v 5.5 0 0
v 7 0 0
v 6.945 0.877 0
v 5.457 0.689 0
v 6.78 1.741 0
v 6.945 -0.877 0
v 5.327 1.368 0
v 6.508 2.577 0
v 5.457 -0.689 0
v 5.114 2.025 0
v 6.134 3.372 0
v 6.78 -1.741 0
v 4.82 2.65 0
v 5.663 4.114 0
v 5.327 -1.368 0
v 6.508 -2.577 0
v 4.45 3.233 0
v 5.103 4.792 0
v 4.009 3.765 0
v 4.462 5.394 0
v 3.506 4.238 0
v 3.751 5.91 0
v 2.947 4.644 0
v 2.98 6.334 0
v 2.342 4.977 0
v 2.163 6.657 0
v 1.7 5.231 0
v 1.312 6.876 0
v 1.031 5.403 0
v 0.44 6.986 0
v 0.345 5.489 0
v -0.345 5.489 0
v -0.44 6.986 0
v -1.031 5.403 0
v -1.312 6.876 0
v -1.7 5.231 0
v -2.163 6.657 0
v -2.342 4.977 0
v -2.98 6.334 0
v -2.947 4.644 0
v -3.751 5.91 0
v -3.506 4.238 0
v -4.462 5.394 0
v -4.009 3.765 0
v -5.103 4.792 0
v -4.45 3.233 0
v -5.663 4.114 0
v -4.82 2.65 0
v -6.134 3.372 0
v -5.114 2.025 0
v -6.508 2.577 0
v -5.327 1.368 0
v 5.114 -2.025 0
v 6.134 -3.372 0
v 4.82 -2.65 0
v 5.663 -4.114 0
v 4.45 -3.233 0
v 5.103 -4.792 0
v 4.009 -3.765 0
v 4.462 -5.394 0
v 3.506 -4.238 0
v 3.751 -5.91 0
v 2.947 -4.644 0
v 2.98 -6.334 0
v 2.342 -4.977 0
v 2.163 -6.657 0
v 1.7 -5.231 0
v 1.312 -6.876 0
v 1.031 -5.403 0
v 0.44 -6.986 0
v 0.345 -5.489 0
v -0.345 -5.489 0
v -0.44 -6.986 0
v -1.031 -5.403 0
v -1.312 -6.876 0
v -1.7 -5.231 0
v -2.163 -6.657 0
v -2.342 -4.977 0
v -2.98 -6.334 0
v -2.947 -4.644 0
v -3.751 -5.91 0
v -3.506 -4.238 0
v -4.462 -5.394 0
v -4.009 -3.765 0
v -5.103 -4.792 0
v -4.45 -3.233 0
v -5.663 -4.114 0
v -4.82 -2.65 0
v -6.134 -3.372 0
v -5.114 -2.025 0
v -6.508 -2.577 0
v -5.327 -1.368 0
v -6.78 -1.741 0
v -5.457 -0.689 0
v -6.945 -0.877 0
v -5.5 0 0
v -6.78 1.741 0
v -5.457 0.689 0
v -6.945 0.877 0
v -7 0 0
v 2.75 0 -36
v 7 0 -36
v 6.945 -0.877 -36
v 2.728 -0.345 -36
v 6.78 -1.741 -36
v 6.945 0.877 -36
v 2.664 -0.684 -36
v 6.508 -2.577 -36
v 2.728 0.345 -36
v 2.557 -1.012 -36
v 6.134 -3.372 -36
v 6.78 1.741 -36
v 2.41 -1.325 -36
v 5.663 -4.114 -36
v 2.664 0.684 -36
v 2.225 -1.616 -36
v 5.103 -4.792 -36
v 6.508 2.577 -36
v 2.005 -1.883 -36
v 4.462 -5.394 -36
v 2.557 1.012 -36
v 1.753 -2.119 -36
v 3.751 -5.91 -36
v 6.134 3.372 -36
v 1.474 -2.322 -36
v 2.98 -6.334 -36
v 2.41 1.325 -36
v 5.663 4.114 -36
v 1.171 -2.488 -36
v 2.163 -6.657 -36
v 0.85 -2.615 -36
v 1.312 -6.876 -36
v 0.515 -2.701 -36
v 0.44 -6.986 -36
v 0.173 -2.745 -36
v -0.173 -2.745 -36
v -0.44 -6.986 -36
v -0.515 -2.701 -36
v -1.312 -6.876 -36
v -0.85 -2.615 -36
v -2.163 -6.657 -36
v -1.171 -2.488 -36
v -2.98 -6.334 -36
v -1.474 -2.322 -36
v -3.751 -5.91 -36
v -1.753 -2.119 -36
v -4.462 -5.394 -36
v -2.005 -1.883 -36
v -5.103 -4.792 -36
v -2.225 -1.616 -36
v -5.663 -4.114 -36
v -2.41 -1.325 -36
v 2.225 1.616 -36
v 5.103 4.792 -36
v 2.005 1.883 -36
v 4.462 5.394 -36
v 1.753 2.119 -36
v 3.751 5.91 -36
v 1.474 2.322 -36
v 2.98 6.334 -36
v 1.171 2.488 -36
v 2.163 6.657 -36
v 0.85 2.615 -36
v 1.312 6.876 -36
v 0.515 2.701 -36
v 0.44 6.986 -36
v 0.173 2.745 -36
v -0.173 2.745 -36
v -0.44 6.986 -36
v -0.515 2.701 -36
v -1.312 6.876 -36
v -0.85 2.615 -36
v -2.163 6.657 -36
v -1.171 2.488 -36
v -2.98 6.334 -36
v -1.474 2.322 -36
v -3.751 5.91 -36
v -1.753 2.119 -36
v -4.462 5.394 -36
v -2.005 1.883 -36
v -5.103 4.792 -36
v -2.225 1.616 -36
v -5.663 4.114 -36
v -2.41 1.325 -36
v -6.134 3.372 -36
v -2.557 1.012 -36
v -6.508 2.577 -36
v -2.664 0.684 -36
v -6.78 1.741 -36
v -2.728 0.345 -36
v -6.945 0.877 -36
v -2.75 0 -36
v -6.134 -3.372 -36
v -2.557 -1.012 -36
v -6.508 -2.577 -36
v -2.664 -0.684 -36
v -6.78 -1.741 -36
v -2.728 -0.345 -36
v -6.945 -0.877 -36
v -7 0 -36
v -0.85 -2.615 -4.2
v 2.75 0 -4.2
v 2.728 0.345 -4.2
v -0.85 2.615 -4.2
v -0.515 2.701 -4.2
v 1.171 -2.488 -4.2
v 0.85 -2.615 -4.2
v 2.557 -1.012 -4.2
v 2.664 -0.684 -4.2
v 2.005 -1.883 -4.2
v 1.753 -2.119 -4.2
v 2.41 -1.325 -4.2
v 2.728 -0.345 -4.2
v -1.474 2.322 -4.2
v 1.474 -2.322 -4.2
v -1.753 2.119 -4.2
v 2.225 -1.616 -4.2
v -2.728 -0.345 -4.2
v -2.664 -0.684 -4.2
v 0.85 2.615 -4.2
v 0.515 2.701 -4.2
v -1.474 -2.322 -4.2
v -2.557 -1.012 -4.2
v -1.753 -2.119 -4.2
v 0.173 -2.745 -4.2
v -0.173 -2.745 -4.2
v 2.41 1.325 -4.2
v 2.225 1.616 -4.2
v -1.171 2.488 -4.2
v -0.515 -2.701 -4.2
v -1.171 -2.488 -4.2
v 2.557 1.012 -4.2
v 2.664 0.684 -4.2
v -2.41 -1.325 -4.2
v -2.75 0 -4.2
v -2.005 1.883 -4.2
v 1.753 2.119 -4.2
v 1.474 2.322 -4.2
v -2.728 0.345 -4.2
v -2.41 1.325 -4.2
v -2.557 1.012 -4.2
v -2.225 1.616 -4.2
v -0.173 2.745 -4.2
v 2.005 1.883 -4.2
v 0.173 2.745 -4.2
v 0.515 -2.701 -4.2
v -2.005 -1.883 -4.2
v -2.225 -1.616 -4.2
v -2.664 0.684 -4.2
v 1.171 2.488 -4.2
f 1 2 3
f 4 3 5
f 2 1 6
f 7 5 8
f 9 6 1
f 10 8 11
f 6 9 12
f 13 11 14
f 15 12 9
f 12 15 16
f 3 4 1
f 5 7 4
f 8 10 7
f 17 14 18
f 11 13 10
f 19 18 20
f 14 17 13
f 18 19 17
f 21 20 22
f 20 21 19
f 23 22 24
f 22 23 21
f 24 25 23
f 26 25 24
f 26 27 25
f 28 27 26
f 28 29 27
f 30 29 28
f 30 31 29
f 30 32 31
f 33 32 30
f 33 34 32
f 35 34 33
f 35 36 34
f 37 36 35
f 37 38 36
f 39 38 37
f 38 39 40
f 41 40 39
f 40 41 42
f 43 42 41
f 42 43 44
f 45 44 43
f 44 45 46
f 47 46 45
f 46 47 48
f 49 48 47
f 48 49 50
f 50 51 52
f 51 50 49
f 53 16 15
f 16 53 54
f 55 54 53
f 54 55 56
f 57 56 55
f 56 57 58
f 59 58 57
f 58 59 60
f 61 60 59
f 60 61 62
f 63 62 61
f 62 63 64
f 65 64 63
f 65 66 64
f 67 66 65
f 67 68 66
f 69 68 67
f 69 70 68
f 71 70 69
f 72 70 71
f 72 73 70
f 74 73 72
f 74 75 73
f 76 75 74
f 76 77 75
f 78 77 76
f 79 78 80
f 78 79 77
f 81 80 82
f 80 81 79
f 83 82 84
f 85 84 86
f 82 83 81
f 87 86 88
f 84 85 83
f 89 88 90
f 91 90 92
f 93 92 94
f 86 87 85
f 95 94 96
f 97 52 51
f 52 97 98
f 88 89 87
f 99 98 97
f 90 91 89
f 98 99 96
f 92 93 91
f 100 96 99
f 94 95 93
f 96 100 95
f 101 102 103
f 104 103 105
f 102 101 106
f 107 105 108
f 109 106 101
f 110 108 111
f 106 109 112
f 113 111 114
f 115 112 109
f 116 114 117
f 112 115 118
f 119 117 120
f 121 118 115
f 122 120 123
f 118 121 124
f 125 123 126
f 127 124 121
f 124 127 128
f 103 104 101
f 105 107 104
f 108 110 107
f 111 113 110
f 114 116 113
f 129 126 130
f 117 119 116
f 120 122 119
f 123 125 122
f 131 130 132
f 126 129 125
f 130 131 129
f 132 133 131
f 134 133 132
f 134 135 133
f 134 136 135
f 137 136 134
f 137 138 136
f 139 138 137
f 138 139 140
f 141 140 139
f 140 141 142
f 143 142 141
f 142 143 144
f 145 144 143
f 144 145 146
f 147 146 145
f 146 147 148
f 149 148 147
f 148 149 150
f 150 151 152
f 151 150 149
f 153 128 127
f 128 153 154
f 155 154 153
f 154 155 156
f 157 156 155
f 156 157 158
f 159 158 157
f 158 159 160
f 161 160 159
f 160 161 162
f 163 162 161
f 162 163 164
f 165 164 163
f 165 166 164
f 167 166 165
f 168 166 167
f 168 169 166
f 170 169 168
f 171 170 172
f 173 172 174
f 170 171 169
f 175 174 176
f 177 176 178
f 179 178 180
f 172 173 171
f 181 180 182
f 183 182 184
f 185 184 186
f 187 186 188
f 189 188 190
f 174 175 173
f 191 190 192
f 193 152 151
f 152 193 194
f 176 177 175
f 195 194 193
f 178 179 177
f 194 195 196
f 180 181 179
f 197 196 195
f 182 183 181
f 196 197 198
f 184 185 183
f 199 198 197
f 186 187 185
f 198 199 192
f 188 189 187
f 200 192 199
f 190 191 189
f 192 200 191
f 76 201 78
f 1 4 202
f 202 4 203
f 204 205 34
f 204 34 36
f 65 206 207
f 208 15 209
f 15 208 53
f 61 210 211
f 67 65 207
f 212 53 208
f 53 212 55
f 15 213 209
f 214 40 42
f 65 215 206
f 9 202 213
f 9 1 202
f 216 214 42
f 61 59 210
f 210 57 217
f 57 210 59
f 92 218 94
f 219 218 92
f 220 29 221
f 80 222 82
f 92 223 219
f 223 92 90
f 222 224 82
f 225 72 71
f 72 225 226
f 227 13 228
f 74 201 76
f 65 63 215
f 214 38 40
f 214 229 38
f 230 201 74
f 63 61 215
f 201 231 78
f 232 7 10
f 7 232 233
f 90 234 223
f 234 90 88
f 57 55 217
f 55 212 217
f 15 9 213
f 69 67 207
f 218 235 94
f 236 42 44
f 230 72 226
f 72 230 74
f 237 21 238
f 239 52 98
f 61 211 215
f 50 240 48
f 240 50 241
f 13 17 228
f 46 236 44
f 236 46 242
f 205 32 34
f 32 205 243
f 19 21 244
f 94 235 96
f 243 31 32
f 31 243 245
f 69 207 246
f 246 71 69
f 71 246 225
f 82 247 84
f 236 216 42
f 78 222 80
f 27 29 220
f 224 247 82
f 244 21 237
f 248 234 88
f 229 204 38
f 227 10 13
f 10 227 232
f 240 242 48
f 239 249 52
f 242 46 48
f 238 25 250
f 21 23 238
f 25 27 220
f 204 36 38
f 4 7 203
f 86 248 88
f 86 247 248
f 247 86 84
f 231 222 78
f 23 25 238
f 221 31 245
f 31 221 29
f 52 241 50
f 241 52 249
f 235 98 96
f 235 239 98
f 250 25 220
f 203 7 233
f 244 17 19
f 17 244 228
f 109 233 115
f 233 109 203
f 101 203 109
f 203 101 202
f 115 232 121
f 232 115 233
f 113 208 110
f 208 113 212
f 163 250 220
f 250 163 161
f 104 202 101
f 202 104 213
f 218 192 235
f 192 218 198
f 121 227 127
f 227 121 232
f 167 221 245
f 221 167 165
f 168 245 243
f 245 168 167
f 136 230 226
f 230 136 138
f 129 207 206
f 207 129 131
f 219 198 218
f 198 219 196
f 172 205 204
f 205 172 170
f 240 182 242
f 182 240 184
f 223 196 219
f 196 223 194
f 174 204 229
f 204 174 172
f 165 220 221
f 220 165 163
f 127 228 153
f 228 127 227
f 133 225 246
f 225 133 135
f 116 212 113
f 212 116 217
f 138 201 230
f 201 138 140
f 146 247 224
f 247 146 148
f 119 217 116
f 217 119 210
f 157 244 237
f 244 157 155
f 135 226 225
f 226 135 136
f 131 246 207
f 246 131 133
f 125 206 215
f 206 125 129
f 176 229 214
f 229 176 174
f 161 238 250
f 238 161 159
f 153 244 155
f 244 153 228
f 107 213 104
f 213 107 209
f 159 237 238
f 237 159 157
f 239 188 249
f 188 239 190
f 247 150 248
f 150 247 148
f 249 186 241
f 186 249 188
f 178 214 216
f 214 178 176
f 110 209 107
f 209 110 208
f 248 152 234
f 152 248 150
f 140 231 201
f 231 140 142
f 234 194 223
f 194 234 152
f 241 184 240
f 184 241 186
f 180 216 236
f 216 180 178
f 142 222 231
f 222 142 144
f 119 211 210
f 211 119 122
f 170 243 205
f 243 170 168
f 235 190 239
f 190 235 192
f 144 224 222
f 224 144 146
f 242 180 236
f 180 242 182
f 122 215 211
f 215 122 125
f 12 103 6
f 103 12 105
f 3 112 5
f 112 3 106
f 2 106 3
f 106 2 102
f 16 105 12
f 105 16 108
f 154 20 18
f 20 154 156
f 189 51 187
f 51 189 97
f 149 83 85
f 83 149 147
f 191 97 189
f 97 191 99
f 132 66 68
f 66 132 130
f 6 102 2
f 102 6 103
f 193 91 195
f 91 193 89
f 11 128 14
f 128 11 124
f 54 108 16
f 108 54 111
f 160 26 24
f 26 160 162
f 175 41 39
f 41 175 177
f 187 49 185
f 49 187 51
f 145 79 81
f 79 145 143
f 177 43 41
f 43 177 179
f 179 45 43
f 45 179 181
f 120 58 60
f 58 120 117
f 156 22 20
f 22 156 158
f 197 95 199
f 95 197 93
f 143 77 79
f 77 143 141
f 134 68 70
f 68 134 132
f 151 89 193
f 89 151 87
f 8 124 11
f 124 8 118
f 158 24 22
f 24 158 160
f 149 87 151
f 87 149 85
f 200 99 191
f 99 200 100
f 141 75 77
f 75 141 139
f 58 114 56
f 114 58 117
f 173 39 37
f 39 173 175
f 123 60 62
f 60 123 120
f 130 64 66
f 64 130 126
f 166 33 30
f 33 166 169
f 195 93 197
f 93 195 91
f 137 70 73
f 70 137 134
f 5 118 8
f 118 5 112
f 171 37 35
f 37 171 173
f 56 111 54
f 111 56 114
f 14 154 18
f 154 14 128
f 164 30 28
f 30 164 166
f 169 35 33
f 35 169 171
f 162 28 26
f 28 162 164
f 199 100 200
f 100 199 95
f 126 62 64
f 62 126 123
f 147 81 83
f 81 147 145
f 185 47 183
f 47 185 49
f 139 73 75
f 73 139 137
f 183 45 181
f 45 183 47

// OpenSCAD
$fn = 50;


difference() {
	union() {
		translate(v = [0, 0, -36.0000000000]) {
			cylinder(h = 36, r = 7.0000000000);
		}
		cylinder(h = 0, r = 13.0000000000);
	}
	union() {
		translate(v = [0, 0, 0]) {
			rotate(a = [0, 0, 0]) {
				difference() {
					union() {
						#translate(v = [0, 0, -36.0000000000]) {
							cylinder(h = 36, r = 2.2500000000);
						}
						#translate(v = [0, 0, -4.2000000000]) {
							cylinder(h = 4.2000000000, r = 7.0000000000, r1 = 2.7500000000, r2 = 5.5000000000);
						}
						#translate(v = [0, 0, -36.0000000000]) {
							cylinder(h = 36, r = 2.7500000000);
						}
						#translate(v = [0, 0, -36.0000000000]) {
							cylinder(h = 36, r = 2.2500000000);
						}
					}
					union();
				}
			}
		}
	}
}
